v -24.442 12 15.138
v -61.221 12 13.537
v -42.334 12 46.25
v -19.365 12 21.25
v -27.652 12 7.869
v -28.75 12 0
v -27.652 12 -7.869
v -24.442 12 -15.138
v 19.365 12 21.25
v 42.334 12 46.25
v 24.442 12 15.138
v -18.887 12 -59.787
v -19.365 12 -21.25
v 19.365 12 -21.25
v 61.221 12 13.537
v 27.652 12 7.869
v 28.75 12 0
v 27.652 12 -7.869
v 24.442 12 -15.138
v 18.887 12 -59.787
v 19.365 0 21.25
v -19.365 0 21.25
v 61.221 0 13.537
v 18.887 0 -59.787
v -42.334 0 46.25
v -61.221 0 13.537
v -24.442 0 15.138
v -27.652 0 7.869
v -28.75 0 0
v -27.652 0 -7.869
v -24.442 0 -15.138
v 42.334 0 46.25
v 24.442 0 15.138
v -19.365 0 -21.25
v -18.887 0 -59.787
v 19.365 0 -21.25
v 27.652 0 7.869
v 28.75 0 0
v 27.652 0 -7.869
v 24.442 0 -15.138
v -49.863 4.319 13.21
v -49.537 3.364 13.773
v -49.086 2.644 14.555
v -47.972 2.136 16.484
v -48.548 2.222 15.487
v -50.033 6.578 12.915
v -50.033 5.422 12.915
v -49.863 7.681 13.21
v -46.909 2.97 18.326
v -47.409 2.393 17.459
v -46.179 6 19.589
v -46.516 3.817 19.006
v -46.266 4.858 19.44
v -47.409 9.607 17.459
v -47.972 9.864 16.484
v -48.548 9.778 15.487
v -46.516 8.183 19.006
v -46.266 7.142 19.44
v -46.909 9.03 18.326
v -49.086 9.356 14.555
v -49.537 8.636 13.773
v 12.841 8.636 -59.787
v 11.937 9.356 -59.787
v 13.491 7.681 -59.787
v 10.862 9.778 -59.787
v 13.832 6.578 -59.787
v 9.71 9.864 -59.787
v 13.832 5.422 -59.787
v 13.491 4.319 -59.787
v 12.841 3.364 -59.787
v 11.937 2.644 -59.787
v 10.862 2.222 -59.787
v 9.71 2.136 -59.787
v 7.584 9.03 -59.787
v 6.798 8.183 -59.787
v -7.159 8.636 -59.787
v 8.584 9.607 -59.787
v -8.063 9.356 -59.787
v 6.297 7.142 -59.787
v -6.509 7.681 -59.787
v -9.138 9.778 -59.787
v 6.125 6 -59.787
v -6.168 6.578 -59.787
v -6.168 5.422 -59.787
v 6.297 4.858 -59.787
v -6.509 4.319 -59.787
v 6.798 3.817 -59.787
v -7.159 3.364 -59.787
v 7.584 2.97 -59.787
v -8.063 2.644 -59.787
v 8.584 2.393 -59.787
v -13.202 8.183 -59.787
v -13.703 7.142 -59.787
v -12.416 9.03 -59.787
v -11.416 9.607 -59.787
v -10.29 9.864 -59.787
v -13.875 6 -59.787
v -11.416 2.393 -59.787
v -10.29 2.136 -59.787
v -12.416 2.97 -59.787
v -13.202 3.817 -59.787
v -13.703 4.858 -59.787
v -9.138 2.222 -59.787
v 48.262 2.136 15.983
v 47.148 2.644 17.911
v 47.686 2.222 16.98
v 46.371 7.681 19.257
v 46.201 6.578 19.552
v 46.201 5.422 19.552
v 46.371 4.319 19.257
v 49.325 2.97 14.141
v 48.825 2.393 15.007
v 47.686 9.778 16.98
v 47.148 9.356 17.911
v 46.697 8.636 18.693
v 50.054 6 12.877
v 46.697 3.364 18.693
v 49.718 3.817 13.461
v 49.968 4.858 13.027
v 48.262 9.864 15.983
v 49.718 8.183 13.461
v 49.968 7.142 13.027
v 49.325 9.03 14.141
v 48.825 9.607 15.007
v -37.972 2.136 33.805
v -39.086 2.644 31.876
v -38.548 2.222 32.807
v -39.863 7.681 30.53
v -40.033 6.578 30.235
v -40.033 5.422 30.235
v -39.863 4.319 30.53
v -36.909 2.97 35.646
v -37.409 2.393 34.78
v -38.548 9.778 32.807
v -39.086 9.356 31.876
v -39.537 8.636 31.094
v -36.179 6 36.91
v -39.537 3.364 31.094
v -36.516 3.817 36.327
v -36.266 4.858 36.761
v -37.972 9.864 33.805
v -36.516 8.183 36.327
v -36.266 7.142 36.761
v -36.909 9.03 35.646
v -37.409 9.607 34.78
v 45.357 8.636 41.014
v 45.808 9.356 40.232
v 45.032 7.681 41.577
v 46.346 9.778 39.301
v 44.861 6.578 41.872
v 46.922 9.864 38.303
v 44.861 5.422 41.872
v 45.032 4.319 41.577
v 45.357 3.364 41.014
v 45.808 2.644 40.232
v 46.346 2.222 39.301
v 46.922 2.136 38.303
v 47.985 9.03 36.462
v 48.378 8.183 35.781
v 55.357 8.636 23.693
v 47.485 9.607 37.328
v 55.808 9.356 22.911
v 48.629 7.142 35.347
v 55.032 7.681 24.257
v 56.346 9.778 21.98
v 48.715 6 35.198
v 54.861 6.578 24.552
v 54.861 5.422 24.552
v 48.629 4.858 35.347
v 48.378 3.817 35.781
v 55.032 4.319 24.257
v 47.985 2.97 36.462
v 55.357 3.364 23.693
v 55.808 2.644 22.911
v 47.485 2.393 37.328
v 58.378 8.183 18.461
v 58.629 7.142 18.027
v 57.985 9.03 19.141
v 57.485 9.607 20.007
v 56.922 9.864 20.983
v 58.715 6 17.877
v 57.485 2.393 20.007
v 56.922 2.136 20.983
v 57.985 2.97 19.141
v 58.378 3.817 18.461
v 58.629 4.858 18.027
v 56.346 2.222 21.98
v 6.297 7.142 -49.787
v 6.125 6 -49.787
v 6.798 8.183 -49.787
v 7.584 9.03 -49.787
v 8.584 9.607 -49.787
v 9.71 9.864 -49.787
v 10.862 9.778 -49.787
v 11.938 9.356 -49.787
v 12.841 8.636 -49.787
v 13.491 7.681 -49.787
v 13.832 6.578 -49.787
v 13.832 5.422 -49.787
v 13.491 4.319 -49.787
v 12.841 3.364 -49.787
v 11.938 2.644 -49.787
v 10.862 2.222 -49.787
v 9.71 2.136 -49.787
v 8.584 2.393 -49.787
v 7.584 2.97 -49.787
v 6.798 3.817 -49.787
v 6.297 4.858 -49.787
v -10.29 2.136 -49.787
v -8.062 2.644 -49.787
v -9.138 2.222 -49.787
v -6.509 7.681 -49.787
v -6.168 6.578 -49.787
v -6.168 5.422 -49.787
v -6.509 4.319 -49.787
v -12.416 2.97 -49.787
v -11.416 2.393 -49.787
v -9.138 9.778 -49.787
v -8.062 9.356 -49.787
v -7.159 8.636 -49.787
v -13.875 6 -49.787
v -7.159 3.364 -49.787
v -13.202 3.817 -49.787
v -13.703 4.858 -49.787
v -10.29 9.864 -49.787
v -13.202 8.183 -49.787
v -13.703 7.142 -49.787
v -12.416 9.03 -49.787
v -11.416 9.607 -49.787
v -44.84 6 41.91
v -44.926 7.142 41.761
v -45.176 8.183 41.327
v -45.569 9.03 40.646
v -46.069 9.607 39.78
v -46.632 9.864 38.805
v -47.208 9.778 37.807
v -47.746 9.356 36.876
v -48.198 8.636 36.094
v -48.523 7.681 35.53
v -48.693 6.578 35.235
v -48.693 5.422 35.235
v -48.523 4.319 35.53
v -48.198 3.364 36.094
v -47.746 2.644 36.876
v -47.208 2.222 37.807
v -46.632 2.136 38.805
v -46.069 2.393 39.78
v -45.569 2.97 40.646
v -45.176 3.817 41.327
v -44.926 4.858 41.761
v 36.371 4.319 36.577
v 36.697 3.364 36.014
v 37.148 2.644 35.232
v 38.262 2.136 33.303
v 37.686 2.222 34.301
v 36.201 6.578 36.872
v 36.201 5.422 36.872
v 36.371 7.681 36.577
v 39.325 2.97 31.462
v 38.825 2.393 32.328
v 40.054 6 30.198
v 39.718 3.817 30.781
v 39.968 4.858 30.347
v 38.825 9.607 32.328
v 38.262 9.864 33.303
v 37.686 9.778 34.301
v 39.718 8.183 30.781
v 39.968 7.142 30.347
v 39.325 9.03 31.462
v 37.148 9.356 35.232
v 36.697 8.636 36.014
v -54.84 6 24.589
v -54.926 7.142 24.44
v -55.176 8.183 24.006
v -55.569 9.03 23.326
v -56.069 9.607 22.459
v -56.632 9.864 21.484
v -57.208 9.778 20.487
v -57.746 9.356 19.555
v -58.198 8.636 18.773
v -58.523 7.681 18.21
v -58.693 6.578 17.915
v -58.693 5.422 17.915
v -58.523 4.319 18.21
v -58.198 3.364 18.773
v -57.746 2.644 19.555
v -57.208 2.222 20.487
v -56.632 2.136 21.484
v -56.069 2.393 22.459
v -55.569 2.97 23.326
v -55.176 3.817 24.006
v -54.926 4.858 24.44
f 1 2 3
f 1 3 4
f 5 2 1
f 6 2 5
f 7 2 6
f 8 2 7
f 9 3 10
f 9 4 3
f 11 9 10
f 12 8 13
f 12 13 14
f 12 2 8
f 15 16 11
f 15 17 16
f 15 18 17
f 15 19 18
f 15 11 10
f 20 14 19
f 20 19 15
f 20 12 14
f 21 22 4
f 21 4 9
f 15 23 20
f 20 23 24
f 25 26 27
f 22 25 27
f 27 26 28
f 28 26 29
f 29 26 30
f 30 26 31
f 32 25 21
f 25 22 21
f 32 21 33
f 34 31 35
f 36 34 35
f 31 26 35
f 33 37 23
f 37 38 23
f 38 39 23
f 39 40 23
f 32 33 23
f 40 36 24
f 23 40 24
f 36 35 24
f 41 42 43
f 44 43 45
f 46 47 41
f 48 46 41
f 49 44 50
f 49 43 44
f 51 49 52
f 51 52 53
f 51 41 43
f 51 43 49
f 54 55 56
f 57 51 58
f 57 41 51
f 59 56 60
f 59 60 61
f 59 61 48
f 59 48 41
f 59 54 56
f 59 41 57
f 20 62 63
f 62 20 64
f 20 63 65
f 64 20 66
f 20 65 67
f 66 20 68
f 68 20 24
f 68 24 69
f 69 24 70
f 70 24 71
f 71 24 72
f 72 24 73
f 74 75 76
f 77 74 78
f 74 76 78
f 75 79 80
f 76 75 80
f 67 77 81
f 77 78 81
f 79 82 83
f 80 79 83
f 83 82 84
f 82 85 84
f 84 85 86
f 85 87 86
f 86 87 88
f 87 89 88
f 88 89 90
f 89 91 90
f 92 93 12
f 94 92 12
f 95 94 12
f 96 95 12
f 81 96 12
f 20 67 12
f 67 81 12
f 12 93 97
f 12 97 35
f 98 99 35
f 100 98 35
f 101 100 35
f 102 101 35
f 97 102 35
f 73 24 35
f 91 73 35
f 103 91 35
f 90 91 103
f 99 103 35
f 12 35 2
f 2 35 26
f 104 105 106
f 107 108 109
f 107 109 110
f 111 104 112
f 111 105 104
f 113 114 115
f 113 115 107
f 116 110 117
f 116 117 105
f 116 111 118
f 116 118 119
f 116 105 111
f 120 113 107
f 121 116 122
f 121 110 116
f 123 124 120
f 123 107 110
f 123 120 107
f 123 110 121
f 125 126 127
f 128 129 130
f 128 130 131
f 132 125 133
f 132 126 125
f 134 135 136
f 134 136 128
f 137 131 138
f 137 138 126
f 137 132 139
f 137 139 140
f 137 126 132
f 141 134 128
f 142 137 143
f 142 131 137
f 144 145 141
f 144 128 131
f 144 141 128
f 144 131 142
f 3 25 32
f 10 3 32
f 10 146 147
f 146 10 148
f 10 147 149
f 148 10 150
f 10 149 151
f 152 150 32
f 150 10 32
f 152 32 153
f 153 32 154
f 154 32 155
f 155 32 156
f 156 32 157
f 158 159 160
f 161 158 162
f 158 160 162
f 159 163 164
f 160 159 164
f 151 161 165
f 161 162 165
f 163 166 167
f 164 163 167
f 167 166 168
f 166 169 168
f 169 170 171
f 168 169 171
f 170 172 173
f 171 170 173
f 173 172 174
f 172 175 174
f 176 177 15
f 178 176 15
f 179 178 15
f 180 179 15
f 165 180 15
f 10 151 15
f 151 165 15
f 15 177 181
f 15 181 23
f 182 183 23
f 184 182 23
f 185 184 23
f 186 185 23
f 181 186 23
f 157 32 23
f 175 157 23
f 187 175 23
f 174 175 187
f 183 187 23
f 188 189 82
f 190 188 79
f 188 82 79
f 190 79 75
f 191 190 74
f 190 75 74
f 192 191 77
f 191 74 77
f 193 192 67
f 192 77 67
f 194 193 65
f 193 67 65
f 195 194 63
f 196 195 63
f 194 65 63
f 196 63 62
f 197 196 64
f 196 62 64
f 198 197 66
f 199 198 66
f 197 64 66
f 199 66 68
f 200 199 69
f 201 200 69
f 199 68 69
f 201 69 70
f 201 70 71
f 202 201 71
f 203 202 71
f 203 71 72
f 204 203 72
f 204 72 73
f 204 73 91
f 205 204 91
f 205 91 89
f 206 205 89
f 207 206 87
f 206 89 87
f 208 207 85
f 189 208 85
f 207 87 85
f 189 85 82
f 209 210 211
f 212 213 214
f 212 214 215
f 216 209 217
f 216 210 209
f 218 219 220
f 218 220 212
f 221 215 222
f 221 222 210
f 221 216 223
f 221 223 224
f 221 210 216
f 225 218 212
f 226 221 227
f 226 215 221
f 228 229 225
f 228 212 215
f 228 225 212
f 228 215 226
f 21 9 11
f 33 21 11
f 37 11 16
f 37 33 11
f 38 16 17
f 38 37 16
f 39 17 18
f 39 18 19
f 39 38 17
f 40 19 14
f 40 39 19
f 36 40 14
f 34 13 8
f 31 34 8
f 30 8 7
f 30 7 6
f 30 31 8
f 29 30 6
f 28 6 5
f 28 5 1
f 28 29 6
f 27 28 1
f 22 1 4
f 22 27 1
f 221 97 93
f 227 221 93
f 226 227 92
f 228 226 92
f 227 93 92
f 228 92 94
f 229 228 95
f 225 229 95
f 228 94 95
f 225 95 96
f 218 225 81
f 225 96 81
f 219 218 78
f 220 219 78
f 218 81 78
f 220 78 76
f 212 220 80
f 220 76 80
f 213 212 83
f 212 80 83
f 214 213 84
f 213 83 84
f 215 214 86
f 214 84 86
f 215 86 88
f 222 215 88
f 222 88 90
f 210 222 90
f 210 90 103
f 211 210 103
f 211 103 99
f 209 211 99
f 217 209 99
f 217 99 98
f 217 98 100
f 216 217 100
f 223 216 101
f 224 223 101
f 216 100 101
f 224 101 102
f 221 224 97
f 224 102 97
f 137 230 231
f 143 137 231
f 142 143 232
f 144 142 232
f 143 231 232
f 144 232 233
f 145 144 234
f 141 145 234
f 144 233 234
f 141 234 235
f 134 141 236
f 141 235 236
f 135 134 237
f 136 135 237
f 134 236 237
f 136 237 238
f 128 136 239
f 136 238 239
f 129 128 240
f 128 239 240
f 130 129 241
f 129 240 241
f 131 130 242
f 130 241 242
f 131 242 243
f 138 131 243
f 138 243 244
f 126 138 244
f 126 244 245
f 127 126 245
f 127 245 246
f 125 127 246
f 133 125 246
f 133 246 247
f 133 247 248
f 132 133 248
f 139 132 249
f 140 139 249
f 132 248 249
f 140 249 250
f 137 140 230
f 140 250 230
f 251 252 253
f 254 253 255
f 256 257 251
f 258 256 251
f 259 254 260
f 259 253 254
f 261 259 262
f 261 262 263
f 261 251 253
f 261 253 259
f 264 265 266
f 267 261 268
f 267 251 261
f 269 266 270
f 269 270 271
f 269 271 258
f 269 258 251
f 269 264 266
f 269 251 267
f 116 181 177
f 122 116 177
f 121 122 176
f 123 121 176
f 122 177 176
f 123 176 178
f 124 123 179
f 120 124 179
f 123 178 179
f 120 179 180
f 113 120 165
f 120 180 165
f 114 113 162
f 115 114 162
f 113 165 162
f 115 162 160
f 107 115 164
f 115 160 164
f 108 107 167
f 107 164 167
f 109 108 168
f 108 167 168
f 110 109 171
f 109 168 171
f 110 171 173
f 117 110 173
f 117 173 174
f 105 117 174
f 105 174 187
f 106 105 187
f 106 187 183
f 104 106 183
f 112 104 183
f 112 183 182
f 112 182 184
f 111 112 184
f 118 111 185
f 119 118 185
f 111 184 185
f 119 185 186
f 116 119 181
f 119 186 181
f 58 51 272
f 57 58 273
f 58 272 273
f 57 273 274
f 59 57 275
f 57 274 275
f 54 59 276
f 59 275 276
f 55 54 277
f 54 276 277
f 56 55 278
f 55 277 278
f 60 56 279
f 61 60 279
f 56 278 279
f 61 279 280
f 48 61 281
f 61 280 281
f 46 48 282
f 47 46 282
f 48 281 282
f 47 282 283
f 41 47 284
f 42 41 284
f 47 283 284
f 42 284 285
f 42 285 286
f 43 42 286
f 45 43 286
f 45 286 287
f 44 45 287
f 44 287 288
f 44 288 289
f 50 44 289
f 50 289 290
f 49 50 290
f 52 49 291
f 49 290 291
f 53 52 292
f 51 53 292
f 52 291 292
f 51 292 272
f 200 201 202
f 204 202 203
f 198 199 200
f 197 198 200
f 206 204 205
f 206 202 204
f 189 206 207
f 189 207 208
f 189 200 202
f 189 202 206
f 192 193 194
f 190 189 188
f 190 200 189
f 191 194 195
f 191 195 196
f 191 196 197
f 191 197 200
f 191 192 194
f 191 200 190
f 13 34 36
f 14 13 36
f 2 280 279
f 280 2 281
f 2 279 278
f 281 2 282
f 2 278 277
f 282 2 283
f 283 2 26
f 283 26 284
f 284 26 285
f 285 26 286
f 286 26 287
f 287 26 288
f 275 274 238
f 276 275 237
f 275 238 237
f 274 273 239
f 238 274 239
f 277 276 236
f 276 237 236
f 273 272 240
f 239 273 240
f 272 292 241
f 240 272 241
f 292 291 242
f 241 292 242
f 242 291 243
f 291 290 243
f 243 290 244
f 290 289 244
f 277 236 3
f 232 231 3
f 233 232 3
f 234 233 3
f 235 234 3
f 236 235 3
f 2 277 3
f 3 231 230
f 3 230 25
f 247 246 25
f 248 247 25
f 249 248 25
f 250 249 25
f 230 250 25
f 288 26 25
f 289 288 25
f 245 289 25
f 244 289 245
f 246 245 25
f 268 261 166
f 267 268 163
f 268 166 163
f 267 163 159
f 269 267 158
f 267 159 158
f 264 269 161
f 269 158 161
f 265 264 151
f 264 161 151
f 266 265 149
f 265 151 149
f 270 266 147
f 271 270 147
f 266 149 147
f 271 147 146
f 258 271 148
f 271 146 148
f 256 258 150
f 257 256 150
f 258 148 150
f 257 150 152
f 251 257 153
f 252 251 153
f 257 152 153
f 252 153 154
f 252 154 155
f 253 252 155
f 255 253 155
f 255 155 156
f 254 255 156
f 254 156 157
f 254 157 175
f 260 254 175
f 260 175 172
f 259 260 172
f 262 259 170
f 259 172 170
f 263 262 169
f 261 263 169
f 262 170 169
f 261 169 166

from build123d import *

# Parameters (mm, degrees)
CROQUIS1_W              = 57.5
CROQUIS1_H              = 42.5
SALIENTE_EXTRUIR1_DEPTH = 12
CROQUIS7_R              = 46.25
CROQUIS7_R_2            = 28.75
SALIENTE_EXTRUIR2_DEPTH = 12
CROQUIS8_R              = 3.875
CORTAR_EXTRUIR1_DEPTH   = 10
MATRIZC1_COUNT          = 3


with BuildPart() as part:
    # Croquis1 → Saliente-Extruir1 (new body)
    with BuildSketch(Plane(origin=(0, 0, 0), x_dir=(1, 0, 0), z_dir=(0, 1, 0))):
        Polygon((-18.886751346, 59.787187079), (-61.220598504, -13.537187079), (-42.333847158, -46.25), (42.333847158, -46.25), (61.220598504, -13.537187079), (18.886751346, 59.787187079), align=None)
        Rectangle(CROQUIS1_W, CROQUIS1_H, mode=Mode.SUBTRACT)
    extrude(amount=SALIENTE_EXTRUIR1_DEPTH)

    # Croquis7 → Saliente-Extruir2 (add)
    with BuildSketch(Plane(origin=(0, 0, 0), x_dir=(1, 0, 0), z_dir=(0, 1, 0))):
        Circle(CROQUIS7_R)
        Circle(CROQUIS7_R_2, mode=Mode.SUBTRACT)
    extrude(amount=SALIENTE_EXTRUIR2_DEPTH)

    # Croquis8 → Cortar-Extruir1 (cut)
    with BuildSketch(Plane(origin=(51.777222831, 0, 29.893593539), x_dir=(0.5, 0, -0.866025404), z_dir=(0.866025404, 0, 0.5))):
        with Locations((-10, 6)):
            Circle(CROQUIS8_R)
        with Locations((10, 6)):
            Circle(CROQUIS8_R)
    cortar_extruir1 = extrude(amount=-CORTAR_EXTRUIR1_DEPTH, mode=Mode.SUBTRACT)

    # MatrizC1: Cortar-Extruir1 ×3 about axis
    matrizc1_axis = Axis((0, 0, 0), (0, 1, 0))
    for i in range(1, MATRIZC1_COUNT):
        add(cortar_extruir1.rotate(matrizc1_axis, i * 360 / MATRIZC1_COUNT), mode=Mode.SUBTRACT)


solid = part.part
